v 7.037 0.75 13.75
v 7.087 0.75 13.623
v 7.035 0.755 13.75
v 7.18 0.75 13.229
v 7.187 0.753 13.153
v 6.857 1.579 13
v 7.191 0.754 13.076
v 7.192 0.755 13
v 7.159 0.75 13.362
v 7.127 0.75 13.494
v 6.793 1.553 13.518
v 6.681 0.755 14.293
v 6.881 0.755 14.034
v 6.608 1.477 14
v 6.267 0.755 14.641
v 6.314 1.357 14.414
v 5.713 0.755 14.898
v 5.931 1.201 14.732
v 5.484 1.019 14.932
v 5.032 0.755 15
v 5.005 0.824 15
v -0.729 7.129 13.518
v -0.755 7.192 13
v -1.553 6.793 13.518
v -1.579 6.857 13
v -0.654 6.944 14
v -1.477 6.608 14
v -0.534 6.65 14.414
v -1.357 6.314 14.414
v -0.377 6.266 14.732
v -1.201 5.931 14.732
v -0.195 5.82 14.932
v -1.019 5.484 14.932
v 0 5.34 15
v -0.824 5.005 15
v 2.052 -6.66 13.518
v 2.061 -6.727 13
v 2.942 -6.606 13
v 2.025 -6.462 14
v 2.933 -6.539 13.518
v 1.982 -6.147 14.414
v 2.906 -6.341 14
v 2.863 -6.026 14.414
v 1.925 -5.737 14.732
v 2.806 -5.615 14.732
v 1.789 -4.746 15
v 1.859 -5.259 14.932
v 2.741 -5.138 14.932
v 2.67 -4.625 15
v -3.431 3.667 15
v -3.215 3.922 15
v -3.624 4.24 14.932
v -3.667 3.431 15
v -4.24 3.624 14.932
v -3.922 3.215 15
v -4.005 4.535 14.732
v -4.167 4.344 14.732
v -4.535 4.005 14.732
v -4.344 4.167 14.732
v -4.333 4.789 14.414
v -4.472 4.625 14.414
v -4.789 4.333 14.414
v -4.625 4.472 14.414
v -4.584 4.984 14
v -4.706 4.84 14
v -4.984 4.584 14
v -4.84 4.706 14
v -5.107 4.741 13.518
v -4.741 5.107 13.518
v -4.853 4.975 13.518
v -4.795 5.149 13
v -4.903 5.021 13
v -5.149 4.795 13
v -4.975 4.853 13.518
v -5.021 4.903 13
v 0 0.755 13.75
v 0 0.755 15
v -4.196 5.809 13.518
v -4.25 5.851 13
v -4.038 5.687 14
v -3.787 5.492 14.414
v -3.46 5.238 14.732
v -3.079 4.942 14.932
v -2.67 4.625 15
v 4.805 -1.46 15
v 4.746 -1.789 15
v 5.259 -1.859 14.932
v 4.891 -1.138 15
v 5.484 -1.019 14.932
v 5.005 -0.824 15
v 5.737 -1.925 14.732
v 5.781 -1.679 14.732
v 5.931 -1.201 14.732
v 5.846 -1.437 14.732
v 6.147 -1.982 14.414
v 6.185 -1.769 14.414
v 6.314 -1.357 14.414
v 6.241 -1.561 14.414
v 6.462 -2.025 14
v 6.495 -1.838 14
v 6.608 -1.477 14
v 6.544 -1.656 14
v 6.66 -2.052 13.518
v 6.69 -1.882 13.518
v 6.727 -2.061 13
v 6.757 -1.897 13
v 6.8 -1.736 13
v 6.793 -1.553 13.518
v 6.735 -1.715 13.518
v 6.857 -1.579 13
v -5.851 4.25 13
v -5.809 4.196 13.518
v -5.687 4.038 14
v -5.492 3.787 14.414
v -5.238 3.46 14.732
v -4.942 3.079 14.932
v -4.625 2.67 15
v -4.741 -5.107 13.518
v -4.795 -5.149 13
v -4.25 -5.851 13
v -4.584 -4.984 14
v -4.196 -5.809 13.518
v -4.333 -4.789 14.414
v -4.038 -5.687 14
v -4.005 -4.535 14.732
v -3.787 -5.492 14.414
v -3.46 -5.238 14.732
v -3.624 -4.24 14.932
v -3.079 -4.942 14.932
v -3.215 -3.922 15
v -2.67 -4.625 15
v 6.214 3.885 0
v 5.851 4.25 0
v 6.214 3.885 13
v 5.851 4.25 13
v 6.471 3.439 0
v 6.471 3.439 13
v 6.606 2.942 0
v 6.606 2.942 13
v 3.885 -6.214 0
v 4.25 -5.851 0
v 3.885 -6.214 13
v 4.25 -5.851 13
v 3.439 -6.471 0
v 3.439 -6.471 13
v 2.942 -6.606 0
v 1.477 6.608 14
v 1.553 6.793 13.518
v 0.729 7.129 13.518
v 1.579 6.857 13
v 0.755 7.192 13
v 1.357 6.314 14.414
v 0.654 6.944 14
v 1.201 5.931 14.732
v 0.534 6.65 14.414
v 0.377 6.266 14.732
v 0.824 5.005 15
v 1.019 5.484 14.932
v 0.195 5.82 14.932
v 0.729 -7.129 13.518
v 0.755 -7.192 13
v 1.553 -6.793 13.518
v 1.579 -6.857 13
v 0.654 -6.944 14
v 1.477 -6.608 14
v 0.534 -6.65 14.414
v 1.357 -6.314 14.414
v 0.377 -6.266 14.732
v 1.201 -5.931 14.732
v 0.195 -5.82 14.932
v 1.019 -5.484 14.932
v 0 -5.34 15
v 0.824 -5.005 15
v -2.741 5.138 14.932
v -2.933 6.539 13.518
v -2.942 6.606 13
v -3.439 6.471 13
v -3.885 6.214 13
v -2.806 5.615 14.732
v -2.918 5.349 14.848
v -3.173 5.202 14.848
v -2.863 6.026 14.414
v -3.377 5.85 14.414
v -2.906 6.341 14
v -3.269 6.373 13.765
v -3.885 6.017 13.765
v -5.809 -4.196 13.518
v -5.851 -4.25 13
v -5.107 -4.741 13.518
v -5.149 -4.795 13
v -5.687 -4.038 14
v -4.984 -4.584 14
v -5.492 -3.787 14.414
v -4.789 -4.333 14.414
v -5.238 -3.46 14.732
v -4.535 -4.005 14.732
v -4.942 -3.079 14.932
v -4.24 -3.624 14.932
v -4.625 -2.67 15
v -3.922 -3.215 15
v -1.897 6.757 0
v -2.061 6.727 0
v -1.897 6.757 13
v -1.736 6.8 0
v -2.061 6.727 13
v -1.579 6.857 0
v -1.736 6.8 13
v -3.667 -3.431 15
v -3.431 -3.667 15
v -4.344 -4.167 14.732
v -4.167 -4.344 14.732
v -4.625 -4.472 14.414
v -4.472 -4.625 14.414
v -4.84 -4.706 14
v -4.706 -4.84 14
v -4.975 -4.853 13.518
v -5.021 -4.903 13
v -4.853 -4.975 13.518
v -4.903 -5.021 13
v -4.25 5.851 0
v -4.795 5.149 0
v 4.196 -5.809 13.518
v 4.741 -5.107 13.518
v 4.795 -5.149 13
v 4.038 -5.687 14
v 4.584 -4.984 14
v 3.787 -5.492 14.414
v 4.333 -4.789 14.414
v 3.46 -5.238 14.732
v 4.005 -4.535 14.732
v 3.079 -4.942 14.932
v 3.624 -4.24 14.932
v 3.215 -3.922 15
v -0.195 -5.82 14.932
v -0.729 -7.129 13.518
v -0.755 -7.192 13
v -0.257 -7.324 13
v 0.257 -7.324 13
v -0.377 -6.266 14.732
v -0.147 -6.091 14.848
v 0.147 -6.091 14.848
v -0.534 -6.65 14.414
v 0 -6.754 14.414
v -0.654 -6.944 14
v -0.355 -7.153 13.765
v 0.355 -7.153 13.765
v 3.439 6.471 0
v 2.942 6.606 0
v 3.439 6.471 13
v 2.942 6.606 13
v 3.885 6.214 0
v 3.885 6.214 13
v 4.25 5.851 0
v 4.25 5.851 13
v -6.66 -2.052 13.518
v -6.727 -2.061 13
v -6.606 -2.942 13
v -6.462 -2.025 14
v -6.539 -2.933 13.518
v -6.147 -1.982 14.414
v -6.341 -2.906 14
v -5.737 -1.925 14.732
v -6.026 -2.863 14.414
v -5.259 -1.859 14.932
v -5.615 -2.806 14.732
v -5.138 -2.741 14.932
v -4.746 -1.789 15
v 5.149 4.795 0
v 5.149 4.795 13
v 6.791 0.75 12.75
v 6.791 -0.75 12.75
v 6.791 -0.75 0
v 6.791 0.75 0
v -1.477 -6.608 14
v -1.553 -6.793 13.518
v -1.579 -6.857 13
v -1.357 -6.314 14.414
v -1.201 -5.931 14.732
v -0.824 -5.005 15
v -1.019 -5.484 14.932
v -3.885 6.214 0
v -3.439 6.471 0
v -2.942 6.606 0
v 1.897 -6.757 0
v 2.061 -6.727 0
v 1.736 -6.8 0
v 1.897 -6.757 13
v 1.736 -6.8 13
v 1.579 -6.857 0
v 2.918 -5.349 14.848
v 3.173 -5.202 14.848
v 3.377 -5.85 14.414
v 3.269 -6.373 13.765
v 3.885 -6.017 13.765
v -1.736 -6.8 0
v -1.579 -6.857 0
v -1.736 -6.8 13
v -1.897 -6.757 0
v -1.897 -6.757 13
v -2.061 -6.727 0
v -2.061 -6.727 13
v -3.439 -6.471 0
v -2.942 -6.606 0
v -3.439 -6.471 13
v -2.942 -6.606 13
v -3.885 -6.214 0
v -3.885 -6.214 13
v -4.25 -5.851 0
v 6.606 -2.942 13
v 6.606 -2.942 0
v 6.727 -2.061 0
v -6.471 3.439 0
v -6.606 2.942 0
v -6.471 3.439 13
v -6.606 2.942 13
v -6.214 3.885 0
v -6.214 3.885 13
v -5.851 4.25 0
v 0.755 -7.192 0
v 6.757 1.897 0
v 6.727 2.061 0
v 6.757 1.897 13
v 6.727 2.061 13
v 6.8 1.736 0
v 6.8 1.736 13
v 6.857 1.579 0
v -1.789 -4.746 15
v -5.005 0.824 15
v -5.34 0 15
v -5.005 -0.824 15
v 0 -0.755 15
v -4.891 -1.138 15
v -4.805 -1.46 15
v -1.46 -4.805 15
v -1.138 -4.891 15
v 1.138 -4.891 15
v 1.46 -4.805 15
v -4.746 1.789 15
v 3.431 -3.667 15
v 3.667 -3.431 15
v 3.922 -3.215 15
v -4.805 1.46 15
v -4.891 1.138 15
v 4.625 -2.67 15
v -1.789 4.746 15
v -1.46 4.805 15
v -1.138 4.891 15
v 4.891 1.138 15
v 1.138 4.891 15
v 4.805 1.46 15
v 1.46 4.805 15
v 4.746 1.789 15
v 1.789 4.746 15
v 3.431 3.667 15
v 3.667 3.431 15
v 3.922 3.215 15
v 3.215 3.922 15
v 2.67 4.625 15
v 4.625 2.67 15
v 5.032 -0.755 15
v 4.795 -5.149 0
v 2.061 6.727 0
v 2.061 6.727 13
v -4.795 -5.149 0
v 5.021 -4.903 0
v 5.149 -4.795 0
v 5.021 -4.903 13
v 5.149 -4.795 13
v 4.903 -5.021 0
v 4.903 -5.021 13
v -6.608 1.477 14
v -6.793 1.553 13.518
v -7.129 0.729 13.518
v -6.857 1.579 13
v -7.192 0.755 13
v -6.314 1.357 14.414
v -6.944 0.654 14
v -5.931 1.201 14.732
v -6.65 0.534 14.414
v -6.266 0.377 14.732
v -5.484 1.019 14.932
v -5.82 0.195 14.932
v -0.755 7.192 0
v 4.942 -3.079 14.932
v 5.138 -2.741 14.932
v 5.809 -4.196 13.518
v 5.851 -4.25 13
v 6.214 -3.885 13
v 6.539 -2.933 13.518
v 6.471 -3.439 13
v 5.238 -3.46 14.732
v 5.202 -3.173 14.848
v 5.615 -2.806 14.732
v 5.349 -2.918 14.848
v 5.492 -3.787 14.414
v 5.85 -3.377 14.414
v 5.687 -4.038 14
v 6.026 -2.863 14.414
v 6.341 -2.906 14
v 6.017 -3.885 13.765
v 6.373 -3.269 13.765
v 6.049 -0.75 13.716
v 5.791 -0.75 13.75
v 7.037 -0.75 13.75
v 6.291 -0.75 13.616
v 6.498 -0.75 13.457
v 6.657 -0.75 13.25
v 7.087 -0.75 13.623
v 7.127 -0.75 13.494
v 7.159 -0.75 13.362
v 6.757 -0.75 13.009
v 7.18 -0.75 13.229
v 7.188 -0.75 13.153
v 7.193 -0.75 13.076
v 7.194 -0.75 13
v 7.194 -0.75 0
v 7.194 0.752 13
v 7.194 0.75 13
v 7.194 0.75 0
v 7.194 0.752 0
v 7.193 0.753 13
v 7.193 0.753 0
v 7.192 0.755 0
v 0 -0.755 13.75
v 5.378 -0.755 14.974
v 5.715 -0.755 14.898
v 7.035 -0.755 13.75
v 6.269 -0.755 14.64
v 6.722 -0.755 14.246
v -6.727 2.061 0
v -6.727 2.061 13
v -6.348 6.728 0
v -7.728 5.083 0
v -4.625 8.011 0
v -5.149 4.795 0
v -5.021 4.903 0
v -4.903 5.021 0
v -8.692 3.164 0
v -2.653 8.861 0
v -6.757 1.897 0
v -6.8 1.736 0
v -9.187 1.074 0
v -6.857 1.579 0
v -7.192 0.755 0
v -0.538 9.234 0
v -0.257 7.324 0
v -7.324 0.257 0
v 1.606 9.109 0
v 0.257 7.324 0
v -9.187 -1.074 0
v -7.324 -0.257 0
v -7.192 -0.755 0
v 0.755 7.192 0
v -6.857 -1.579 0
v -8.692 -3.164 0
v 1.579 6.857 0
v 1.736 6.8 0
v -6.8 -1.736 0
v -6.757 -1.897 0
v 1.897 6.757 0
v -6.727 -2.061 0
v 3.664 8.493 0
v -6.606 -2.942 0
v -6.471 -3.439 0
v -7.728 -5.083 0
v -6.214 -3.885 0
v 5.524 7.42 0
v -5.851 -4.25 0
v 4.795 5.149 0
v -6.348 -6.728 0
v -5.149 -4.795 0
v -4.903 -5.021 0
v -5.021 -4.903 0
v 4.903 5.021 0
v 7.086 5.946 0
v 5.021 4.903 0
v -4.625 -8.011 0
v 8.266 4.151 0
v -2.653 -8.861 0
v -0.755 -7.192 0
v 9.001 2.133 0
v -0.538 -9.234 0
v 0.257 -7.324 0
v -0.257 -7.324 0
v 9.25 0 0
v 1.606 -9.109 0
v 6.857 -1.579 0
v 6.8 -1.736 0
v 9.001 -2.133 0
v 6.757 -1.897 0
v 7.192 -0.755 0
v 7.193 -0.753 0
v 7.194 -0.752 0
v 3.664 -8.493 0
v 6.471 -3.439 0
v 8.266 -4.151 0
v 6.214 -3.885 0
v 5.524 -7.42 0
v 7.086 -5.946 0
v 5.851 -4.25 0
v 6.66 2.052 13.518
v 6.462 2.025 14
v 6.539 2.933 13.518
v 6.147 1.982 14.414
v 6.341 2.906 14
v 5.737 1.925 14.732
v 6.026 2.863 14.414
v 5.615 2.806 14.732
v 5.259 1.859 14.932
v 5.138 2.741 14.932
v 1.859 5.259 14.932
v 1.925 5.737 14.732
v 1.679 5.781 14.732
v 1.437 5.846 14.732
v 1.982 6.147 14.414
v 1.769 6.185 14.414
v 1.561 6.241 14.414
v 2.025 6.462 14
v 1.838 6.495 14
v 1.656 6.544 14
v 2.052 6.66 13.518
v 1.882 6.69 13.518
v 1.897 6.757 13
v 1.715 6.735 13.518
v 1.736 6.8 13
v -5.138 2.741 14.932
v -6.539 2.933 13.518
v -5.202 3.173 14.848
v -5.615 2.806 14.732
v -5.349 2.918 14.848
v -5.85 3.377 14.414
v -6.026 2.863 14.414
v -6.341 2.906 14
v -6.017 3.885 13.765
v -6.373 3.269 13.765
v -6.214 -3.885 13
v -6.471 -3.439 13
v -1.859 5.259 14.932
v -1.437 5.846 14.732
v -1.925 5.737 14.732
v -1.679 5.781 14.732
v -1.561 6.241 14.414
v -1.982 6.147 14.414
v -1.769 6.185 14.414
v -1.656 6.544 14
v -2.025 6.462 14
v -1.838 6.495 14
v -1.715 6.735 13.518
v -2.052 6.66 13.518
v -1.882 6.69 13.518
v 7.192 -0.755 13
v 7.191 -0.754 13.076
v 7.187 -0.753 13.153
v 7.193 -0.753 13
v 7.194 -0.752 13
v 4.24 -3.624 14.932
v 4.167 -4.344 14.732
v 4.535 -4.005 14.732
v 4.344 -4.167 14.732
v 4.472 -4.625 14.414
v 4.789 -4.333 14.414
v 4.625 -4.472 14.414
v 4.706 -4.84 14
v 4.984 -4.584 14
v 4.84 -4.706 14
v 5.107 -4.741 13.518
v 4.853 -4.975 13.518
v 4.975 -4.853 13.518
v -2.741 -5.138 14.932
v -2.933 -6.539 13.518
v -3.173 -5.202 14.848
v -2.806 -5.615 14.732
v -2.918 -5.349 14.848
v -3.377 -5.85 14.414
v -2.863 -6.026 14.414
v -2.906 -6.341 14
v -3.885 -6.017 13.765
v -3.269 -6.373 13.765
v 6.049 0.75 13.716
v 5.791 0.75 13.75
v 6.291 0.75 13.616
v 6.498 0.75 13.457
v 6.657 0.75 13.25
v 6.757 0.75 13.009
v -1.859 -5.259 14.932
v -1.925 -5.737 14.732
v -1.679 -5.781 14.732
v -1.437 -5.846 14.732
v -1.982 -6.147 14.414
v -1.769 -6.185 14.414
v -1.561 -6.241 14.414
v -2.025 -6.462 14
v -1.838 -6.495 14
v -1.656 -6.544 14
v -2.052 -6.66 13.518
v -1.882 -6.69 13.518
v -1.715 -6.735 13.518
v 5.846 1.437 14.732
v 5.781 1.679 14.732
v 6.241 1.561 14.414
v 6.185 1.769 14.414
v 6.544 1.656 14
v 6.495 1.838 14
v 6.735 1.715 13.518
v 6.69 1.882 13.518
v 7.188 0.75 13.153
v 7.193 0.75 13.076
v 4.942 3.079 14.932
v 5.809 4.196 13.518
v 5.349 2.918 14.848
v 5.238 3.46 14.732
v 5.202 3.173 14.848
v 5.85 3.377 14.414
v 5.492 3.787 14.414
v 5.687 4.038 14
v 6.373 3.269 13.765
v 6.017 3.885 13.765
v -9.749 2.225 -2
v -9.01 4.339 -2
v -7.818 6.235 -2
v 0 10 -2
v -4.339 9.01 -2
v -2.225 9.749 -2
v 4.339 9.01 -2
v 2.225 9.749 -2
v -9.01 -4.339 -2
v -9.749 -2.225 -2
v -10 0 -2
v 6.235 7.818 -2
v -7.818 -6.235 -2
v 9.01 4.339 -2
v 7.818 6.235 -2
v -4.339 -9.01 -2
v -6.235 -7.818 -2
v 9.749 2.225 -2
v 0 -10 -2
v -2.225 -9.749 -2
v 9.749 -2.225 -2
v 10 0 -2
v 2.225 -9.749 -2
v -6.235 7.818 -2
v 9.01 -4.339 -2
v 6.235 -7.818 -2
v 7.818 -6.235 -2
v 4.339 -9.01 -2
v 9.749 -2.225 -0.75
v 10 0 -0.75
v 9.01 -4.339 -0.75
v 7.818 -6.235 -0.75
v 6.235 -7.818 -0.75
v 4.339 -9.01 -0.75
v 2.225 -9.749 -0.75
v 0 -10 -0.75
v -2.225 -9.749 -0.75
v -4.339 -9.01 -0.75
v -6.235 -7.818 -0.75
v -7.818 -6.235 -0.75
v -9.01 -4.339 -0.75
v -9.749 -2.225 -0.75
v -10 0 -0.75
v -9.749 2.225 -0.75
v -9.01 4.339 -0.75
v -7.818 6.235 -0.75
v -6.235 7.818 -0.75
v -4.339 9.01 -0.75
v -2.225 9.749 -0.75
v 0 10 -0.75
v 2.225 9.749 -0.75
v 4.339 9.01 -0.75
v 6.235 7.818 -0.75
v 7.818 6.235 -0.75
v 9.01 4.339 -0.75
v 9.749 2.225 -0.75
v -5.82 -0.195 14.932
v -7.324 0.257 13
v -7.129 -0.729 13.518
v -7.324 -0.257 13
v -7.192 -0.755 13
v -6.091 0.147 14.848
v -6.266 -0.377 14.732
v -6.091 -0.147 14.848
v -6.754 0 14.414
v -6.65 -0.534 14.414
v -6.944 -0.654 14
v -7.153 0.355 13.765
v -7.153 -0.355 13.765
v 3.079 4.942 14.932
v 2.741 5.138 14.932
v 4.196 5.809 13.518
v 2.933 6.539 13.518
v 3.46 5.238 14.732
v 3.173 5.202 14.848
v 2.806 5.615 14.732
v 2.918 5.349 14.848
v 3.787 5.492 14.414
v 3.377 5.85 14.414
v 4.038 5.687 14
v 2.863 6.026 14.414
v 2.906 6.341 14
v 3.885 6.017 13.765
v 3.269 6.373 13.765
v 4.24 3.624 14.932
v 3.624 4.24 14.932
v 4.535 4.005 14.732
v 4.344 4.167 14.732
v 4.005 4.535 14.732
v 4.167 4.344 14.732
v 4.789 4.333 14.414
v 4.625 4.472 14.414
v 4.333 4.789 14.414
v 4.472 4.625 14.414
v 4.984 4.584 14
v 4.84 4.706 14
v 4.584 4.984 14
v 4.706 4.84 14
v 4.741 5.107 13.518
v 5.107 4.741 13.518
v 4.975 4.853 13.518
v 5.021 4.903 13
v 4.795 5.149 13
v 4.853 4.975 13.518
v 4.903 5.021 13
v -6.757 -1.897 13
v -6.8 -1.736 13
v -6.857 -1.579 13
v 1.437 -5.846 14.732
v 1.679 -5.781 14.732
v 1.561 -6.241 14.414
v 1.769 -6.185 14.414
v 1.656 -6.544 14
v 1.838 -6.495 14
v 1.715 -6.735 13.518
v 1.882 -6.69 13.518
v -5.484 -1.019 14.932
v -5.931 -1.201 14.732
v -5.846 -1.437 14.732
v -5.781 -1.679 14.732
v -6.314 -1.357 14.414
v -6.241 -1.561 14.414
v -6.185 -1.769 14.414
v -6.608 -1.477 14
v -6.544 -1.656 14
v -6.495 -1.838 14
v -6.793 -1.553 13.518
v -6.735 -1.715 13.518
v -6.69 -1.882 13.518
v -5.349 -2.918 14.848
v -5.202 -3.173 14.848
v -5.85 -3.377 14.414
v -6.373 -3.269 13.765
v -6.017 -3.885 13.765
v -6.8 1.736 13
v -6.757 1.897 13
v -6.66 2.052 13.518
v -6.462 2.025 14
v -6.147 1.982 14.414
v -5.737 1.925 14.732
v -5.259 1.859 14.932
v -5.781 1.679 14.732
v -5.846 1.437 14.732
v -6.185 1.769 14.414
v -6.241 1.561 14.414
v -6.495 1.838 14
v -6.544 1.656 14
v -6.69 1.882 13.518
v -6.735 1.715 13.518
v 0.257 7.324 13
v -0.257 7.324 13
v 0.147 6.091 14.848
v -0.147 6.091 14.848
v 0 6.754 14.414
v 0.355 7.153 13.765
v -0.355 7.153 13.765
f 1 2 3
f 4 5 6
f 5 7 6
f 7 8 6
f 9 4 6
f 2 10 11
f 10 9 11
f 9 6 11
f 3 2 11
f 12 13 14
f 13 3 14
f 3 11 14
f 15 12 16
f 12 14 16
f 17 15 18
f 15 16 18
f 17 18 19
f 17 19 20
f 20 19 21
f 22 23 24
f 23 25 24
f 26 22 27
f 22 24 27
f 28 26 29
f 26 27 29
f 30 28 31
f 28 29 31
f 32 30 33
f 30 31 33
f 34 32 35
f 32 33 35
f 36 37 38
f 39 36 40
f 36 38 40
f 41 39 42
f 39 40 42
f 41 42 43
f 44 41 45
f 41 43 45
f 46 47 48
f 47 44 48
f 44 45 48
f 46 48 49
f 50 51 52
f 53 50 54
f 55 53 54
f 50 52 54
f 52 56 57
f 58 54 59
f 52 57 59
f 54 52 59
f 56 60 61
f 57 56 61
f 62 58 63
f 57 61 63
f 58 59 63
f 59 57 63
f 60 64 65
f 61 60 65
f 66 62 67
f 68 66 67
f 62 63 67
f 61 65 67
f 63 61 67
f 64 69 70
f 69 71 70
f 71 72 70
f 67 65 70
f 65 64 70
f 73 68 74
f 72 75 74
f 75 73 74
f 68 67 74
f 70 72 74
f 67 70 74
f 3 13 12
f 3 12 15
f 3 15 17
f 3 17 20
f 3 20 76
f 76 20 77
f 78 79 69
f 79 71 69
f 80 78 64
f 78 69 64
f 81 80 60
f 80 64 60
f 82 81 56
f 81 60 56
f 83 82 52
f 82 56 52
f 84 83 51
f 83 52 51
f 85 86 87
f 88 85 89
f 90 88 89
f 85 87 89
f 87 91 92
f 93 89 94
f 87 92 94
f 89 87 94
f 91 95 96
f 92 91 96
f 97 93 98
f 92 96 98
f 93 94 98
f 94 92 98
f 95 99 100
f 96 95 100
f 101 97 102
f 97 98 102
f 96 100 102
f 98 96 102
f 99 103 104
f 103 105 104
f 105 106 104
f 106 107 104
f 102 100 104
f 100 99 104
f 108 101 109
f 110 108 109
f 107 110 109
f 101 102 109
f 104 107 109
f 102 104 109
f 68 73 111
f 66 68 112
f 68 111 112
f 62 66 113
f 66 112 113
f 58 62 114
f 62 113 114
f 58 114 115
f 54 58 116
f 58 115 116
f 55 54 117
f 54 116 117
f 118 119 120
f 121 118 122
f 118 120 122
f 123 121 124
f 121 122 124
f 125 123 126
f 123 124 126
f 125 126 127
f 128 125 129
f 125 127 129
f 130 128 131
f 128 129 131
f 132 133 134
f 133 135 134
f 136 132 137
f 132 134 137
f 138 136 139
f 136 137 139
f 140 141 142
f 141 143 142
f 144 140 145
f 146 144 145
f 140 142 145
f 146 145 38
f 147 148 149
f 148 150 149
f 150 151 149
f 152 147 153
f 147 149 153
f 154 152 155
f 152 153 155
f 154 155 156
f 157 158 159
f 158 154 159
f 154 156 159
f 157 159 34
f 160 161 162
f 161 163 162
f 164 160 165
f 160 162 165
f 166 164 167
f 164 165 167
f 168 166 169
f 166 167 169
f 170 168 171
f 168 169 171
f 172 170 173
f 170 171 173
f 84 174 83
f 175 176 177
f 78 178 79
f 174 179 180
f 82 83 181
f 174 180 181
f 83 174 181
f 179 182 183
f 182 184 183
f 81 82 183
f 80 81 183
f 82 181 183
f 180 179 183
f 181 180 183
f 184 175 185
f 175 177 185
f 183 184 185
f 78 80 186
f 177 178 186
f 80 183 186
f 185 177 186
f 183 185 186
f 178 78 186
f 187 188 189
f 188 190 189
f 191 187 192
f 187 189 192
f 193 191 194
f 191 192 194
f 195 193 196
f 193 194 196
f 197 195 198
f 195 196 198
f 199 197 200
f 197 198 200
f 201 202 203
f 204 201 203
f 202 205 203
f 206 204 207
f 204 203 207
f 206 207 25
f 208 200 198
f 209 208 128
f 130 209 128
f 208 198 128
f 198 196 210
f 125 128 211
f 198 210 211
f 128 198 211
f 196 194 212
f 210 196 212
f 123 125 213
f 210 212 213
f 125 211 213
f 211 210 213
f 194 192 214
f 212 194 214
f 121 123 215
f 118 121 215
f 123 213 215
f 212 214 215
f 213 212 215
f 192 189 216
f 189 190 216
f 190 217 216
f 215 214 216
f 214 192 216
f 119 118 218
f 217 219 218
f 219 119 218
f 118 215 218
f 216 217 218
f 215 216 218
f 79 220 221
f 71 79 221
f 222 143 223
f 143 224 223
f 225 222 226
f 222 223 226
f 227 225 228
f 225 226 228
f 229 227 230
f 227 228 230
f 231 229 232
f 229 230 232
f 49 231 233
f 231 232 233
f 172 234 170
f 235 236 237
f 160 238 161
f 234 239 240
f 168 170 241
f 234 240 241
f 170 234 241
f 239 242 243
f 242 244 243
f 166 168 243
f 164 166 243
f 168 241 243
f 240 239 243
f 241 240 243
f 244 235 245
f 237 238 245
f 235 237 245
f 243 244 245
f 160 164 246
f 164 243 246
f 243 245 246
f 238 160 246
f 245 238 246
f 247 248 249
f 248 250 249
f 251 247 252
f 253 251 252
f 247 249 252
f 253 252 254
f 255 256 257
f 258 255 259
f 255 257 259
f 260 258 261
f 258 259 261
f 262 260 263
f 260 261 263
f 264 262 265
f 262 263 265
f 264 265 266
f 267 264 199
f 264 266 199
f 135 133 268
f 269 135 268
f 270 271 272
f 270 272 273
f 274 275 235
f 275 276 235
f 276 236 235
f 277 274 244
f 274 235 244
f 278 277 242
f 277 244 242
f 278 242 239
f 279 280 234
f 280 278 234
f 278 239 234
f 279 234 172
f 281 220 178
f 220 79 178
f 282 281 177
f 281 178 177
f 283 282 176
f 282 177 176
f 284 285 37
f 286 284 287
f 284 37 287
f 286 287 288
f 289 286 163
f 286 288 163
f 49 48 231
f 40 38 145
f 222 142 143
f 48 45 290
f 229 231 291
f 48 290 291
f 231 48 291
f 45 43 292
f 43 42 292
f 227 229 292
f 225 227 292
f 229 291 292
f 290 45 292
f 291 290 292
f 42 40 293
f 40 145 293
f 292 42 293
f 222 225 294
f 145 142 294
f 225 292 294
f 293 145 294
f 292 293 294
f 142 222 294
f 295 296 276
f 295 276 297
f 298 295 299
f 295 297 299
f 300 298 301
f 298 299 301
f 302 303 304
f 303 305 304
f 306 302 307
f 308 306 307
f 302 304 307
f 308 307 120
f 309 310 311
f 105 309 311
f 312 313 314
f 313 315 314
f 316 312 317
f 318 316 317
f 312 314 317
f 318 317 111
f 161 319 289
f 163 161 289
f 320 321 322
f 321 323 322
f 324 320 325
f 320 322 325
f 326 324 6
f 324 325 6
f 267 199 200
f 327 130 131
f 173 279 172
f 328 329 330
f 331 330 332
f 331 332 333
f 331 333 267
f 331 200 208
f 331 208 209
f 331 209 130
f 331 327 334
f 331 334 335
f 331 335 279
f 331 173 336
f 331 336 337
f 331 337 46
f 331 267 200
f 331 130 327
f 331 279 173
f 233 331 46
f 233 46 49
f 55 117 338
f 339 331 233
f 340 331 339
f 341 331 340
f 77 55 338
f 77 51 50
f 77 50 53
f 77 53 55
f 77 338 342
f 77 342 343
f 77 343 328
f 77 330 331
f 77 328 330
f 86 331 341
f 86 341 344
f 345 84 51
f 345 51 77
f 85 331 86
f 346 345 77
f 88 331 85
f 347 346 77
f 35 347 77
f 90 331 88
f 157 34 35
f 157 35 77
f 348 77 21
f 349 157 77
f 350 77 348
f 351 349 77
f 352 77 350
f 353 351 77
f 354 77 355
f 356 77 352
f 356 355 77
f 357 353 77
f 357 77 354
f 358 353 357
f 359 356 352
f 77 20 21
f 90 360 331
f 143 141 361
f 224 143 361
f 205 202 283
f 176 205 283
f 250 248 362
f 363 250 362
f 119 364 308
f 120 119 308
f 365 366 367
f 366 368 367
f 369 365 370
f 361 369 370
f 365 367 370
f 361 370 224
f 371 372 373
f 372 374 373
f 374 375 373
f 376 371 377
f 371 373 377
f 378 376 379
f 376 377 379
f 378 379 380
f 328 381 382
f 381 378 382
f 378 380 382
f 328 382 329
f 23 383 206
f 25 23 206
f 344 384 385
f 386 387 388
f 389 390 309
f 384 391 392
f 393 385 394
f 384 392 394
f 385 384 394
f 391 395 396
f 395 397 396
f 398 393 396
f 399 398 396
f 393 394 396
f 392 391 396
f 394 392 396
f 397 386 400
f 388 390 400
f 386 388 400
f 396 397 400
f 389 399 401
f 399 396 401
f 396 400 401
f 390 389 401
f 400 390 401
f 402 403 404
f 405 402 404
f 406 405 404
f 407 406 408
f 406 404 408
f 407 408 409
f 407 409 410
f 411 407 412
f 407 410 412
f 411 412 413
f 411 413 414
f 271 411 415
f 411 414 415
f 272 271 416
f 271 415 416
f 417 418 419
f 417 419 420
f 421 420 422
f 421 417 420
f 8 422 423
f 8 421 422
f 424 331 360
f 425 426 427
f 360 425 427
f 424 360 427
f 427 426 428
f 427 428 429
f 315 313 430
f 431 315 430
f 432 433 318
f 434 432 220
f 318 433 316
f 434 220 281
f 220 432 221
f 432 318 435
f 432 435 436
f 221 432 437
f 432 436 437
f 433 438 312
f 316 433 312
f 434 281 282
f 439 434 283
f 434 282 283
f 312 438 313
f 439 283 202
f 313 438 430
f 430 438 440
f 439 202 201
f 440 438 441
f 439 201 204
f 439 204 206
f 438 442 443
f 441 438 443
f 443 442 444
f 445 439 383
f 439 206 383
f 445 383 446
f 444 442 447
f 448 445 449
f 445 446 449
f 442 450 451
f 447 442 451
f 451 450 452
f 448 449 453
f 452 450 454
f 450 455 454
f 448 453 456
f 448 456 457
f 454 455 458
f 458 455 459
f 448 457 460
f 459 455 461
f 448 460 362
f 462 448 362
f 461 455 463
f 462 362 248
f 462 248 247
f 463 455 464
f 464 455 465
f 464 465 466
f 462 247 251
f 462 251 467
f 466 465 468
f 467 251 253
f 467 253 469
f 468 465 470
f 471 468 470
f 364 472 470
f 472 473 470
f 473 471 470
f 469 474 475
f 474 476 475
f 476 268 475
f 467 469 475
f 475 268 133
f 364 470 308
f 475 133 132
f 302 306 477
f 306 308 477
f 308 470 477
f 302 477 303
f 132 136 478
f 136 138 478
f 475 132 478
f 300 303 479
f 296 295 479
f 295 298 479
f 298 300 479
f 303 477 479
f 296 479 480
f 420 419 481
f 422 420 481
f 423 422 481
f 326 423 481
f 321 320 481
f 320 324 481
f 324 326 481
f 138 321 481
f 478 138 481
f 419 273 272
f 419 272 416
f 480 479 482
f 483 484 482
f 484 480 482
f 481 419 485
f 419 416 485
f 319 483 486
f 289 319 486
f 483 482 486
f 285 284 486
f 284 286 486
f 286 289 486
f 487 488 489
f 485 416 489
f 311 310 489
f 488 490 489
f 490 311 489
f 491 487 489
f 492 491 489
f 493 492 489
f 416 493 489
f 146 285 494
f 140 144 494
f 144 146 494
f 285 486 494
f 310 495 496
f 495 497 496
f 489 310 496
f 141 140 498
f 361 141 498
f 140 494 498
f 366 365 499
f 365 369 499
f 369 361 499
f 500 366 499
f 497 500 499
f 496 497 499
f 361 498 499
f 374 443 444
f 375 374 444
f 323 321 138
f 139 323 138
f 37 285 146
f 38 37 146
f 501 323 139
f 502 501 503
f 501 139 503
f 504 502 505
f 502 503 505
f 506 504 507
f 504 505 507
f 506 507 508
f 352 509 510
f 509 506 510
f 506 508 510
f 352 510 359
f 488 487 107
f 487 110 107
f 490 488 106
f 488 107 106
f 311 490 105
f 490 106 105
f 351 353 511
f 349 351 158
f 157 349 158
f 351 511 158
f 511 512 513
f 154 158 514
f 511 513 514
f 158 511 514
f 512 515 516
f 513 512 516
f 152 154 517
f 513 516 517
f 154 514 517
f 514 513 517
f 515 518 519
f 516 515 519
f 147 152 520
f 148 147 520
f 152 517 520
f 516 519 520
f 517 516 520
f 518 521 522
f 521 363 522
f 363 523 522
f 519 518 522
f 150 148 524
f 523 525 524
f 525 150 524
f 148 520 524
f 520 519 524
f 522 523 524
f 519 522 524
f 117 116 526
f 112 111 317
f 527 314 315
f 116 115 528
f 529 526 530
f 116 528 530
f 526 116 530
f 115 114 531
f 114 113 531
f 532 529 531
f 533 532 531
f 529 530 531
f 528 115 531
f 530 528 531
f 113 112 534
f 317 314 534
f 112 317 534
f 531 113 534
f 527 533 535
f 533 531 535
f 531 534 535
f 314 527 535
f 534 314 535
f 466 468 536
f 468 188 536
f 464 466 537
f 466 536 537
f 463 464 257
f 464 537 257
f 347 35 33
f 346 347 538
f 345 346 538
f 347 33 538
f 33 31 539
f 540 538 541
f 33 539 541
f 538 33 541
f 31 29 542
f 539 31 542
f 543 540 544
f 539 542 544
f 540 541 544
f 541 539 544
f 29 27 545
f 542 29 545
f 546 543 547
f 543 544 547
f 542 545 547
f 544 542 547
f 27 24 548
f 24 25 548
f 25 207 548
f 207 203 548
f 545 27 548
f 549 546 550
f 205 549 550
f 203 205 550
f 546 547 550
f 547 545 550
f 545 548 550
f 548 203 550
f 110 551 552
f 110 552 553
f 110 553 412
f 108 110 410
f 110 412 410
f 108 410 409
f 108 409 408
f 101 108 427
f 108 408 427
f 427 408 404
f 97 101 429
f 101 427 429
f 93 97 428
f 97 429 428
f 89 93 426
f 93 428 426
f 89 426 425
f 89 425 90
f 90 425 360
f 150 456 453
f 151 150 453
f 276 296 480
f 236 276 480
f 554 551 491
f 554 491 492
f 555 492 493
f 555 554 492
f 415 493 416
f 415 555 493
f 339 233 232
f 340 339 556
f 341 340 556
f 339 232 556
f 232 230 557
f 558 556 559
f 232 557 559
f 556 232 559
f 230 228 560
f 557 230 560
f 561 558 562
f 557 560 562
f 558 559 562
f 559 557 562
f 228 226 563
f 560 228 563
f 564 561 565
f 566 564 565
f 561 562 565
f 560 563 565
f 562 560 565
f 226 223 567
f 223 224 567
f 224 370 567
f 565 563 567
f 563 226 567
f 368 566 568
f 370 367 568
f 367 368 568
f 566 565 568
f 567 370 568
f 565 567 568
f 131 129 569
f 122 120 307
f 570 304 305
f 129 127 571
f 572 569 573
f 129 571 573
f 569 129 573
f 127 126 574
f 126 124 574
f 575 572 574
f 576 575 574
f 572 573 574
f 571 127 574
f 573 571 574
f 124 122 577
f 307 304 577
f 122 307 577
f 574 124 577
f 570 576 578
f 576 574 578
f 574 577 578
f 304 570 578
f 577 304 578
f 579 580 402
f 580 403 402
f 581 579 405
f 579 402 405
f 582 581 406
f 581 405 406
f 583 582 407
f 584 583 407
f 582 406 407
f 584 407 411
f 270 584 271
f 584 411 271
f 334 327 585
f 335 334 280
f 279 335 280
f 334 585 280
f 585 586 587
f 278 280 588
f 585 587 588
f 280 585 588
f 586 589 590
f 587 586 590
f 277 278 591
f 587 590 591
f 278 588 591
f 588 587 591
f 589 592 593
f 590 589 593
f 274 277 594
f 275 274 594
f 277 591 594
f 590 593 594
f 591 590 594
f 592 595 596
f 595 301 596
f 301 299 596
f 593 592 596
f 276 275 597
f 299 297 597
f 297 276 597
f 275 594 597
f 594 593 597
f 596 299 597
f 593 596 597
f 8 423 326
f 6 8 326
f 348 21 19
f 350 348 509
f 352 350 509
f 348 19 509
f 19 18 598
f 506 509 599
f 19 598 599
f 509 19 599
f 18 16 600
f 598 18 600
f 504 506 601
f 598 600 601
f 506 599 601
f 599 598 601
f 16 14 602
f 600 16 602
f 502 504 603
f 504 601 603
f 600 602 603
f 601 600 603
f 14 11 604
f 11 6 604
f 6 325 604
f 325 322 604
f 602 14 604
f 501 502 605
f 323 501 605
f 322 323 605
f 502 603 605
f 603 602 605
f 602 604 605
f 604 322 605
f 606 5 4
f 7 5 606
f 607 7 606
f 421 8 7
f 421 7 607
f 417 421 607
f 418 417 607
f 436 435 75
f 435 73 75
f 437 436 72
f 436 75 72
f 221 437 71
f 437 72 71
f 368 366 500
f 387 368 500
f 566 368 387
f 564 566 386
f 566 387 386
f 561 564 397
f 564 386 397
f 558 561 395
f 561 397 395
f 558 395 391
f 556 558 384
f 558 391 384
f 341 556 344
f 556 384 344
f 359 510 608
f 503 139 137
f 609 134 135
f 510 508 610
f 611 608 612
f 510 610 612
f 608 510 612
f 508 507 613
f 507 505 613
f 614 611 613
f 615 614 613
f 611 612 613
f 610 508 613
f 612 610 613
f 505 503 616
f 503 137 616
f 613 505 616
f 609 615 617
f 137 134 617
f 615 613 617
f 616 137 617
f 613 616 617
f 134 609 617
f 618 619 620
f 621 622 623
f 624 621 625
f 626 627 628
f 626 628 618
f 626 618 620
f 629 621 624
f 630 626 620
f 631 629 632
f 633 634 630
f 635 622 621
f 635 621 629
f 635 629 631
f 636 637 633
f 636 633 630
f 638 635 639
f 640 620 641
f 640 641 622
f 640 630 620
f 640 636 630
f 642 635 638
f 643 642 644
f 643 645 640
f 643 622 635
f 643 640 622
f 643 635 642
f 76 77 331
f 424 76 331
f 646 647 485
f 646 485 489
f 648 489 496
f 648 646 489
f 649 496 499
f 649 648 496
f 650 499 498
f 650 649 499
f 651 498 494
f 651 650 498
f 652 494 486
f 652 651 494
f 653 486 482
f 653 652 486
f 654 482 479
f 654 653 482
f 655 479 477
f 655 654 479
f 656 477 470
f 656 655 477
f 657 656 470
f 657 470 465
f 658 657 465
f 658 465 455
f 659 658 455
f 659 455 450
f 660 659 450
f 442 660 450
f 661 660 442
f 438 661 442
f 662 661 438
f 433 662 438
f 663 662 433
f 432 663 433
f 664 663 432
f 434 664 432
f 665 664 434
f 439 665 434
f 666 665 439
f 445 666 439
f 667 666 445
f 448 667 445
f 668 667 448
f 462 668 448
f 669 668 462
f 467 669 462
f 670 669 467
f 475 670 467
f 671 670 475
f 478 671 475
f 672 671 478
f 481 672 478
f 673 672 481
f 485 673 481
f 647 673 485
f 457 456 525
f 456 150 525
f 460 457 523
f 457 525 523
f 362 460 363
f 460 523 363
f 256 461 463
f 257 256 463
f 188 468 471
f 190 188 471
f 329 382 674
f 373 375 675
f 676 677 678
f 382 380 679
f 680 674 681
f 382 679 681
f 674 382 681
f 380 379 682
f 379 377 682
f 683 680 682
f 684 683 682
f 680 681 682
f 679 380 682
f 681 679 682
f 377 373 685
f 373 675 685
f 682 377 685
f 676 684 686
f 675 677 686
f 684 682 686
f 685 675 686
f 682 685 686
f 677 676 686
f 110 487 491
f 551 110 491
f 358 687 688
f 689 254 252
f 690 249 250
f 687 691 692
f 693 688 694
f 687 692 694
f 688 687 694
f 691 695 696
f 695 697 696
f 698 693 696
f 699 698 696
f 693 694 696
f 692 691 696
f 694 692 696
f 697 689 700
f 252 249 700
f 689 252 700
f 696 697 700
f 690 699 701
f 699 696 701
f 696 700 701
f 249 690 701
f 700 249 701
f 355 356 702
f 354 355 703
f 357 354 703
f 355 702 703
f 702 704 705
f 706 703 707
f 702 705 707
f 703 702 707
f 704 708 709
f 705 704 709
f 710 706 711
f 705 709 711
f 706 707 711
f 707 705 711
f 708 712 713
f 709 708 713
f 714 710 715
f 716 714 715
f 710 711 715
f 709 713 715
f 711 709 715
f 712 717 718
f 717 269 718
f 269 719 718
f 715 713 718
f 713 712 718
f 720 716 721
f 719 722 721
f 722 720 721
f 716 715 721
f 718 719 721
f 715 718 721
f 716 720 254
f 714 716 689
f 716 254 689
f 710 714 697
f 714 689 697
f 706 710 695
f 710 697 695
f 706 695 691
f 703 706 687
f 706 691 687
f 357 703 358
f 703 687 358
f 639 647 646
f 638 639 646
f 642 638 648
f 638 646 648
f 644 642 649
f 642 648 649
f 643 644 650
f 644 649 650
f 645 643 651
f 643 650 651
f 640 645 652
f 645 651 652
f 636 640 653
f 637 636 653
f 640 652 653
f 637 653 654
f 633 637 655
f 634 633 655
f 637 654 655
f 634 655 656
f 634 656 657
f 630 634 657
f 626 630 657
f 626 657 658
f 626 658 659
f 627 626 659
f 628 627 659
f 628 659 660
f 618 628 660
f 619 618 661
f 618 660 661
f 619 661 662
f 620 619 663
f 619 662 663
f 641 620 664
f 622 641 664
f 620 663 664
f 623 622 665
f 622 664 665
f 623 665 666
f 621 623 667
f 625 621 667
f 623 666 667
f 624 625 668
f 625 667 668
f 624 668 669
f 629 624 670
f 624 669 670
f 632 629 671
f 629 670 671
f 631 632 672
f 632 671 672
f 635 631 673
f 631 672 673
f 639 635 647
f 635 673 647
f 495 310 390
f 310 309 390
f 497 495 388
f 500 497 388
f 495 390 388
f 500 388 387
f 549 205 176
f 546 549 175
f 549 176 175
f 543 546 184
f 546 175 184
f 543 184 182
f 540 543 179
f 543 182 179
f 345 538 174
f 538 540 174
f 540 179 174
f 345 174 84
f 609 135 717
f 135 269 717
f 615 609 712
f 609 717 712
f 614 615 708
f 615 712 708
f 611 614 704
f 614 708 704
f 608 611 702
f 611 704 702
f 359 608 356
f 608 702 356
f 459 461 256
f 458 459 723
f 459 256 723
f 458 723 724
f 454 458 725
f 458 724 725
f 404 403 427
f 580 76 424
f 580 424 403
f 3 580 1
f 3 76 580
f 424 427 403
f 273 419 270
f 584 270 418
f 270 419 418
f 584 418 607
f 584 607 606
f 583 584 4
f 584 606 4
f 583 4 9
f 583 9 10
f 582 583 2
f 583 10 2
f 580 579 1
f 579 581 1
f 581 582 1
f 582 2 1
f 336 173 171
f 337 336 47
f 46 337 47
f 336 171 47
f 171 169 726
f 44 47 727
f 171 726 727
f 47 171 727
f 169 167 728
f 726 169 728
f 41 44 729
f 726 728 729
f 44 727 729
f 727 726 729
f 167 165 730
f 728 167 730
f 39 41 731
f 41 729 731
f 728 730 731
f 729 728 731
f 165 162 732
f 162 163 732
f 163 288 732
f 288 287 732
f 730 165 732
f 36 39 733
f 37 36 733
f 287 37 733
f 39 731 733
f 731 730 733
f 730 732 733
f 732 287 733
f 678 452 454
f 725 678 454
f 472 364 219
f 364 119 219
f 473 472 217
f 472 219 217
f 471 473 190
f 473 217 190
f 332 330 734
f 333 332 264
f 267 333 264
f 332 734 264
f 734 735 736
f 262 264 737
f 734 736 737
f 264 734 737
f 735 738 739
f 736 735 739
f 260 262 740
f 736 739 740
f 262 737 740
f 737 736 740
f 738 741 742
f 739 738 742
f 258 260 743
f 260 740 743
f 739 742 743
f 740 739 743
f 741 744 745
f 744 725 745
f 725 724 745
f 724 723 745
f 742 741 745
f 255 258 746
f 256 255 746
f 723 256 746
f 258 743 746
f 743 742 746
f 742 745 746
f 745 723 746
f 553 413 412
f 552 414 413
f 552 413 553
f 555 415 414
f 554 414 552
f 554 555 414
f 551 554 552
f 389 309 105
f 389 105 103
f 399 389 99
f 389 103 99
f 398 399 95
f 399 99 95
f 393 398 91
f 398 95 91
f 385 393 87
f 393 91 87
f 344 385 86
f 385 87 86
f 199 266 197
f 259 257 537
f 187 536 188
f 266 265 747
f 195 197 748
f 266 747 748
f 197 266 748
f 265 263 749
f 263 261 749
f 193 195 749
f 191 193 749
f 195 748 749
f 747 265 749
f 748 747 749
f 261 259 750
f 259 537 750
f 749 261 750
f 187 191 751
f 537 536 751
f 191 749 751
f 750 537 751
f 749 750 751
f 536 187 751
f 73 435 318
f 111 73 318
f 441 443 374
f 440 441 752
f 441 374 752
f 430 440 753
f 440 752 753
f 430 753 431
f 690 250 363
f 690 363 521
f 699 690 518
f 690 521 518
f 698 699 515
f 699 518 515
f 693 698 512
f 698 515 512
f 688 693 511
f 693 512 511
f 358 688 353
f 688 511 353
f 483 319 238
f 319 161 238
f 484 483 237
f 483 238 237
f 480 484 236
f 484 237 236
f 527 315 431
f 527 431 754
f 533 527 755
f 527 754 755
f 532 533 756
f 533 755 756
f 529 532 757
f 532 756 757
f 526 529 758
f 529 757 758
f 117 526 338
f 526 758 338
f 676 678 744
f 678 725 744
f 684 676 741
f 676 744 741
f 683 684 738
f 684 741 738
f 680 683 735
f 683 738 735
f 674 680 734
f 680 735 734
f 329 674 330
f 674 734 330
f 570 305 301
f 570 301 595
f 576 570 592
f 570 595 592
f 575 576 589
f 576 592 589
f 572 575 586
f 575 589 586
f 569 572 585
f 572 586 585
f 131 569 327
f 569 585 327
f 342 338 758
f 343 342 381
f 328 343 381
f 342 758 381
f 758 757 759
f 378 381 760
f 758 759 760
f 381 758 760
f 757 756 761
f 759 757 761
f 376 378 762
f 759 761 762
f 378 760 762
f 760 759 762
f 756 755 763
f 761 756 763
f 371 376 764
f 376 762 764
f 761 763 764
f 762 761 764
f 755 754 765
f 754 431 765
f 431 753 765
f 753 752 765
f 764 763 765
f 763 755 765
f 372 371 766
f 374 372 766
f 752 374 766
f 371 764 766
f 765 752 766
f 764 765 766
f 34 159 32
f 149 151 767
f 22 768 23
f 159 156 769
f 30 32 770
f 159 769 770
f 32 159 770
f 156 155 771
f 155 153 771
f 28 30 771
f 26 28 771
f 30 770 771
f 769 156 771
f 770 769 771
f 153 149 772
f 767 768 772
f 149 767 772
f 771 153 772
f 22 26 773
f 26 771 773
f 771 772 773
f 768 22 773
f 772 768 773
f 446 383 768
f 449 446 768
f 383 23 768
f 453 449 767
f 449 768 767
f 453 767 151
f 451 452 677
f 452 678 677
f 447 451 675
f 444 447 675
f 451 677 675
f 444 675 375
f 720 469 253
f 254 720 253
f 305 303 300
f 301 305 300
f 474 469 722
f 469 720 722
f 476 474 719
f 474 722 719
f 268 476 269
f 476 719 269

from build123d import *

# Parameters (mm, degrees)
PAD_DEPTH       = 15
SKETCH001_R     = 10
PAD001_DEPTH    = 2
FILLET_R        = 2
POCKET_DEPTH    = 1.25
POCKET001_DEPTH = 1
FILLET001_R     = 1
CHAMFER_SIZE    = 0.75


with BuildPart() as part:
    # Sketch → Pad (new body)
    with BuildSketch(Plane.XY):
        Polygon((7.5, 0), (6.761481, 1.811733), (6.495191, 3.75), (4.949747, 4.949747), (3.75, 6.495191), (1.811733, 6.761481), (0, 7.5), (-1.811733, 6.761481), (-3.75, 6.495191), (-4.949747, 4.949747), (-6.495191, 3.75), (-6.761481, 1.811733), (-7.5, 0), (-6.761481, -1.811733), (-6.495191, -3.75), (-4.949747, -4.949747), (-3.75, -6.495191), (-1.811733, -6.761481), (0, -7.5), (1.811733, -6.761481), (3.75, -6.495191), (4.949747, -4.949747), (6.495191, -3.75), (6.761481, -1.811733), align=None)
    extrude(amount=PAD_DEPTH)

    # Sketch001 (on Face25 of Pad) → Pad001 (join)
    with BuildSketch(Plane(origin=(0, 0, 0), x_dir=(1, 0, 0), z_dir=(0, 0, -1))):
        Circle(SKETCH001_R)
    extrude(amount=PAD001_DEPTH)

    # Fillet
    fillet_edges = [part.edges().sort_by_distance(p)[0] for p in [
        (7.13074, 0.905867, 15),
        (6.628336, 2.780867, 15),
        (5.722469, 4.349874, 15),
        (4.349874, 5.722469, 15),
        (2.780867, 6.628336, 15),
        (0.905867, 7.13074, 15),
        (-0.905867, 7.13074, 15),
        (-2.780867, 6.628336, 15),
        (-4.349874, 5.722469, 15),
        (-5.722469, 4.349874, 15),
        (-6.628336, 2.780867, 15),
        (-7.13074, 0.905867, 15),
        (-7.13074, -0.905867, 15),
        (-6.628336, -2.780867, 15),
        (-5.722469, -4.349874, 15),
        (-4.349874, -5.722469, 15),
        (-2.780867, -6.628336, 15),
        (-0.905867, -7.13074, 15),
        (0.905867, -7.13074, 15),
        (2.780867, -6.628336, 15),
        (4.349874, -5.722469, 15),
        (5.722469, -4.349874, 15),
        (6.628336, -2.780867, 15),
        (7.13074, -0.905867, 15),
        (-3.75, -6.495191, 7.5),
        (-1.811733, -6.761481, 7.5),
        (0, -7.5, 7.5),
        (1.811733, -6.761481, 7.5),
        (3.75, -6.495191, 7.5),
        (4.949747, -4.949747, 7.5),
        (6.495191, -3.75, 7.5),
        (6.761481, -1.811733, 7.5),
        (7.5, 0, 7.5),
        (6.761481, 1.811733, 7.5),
        (6.495191, 3.75, 7.5),
        (4.949747, 4.949747, 7.5),
        (3.75, 6.495191, 7.5),
        (1.811733, 6.761481, 7.5),
        (0, 7.5, 7.5),
        (-1.811733, 6.761481, 7.5),
        (-3.75, 6.495191, 7.5),
        (-4.949747, 4.949747, 7.5),
        (-6.495191, 3.75, 7.5),
        (-6.761481, 1.811733, 7.5),
        (-7.5, 0, 7.5),
        (-6.761481, -1.811733, 7.5),
        (-6.495191, -3.75, 7.5),
        (-4.949747, -4.949747, 7.5),
    ]]
    fillet(fillet_edges, radius=FILLET_R)

    # Sketch002 (on Face54 of Fillet) → Pocket (cut)
    with BuildSketch(Plane.XY.offset(15)):
        with BuildLine():
            Line((7.192259, 0.754949), (0, 0.754949))
            Line((0, 0.754949), (0, -0.754949))
            Line((0, -0.754949), (7.192259, -0.754949))
            ThreePointArc((7.192259, -0.754949), (7.340219, 0), (7.192259, 0.754949))
        make_face()
    extrude(amount=-POCKET_DEPTH, mode=Mode.SUBTRACT)

    # Sketch003 (on DatumPlane) → Pocket001 (cut)
    with BuildSketch(Plane(origin=(7.790651, 0, 6.5), x_dir=(0, 1, 0), z_dir=(1, 0, 0))):
        Polygon((-0.75, 6.5), (-0.75, -6.5), (0.75, -6.5), (0.75, 6.5), (0.75, 7.25), (-0.75, 7.25), align=None)
    extrude(amount=-POCKET001_DEPTH, mode=Mode.SUBTRACT)

    # Fillet001
    fillet001_edges = [part.edges().sort_by_distance(p)[0] for p in [
        (6.790651, 0, 13.75),
    ]]
    fillet(fillet001_edges, radius=FILLET001_R)

    # Chamfer
    chamfer_edges = [part.edges().sort_by_distance(p)[0] for p in [
        (-10, 0, 0),
    ]]
    chamfer(chamfer_edges, length=CHAMFER_SIZE)


solid = part.part
